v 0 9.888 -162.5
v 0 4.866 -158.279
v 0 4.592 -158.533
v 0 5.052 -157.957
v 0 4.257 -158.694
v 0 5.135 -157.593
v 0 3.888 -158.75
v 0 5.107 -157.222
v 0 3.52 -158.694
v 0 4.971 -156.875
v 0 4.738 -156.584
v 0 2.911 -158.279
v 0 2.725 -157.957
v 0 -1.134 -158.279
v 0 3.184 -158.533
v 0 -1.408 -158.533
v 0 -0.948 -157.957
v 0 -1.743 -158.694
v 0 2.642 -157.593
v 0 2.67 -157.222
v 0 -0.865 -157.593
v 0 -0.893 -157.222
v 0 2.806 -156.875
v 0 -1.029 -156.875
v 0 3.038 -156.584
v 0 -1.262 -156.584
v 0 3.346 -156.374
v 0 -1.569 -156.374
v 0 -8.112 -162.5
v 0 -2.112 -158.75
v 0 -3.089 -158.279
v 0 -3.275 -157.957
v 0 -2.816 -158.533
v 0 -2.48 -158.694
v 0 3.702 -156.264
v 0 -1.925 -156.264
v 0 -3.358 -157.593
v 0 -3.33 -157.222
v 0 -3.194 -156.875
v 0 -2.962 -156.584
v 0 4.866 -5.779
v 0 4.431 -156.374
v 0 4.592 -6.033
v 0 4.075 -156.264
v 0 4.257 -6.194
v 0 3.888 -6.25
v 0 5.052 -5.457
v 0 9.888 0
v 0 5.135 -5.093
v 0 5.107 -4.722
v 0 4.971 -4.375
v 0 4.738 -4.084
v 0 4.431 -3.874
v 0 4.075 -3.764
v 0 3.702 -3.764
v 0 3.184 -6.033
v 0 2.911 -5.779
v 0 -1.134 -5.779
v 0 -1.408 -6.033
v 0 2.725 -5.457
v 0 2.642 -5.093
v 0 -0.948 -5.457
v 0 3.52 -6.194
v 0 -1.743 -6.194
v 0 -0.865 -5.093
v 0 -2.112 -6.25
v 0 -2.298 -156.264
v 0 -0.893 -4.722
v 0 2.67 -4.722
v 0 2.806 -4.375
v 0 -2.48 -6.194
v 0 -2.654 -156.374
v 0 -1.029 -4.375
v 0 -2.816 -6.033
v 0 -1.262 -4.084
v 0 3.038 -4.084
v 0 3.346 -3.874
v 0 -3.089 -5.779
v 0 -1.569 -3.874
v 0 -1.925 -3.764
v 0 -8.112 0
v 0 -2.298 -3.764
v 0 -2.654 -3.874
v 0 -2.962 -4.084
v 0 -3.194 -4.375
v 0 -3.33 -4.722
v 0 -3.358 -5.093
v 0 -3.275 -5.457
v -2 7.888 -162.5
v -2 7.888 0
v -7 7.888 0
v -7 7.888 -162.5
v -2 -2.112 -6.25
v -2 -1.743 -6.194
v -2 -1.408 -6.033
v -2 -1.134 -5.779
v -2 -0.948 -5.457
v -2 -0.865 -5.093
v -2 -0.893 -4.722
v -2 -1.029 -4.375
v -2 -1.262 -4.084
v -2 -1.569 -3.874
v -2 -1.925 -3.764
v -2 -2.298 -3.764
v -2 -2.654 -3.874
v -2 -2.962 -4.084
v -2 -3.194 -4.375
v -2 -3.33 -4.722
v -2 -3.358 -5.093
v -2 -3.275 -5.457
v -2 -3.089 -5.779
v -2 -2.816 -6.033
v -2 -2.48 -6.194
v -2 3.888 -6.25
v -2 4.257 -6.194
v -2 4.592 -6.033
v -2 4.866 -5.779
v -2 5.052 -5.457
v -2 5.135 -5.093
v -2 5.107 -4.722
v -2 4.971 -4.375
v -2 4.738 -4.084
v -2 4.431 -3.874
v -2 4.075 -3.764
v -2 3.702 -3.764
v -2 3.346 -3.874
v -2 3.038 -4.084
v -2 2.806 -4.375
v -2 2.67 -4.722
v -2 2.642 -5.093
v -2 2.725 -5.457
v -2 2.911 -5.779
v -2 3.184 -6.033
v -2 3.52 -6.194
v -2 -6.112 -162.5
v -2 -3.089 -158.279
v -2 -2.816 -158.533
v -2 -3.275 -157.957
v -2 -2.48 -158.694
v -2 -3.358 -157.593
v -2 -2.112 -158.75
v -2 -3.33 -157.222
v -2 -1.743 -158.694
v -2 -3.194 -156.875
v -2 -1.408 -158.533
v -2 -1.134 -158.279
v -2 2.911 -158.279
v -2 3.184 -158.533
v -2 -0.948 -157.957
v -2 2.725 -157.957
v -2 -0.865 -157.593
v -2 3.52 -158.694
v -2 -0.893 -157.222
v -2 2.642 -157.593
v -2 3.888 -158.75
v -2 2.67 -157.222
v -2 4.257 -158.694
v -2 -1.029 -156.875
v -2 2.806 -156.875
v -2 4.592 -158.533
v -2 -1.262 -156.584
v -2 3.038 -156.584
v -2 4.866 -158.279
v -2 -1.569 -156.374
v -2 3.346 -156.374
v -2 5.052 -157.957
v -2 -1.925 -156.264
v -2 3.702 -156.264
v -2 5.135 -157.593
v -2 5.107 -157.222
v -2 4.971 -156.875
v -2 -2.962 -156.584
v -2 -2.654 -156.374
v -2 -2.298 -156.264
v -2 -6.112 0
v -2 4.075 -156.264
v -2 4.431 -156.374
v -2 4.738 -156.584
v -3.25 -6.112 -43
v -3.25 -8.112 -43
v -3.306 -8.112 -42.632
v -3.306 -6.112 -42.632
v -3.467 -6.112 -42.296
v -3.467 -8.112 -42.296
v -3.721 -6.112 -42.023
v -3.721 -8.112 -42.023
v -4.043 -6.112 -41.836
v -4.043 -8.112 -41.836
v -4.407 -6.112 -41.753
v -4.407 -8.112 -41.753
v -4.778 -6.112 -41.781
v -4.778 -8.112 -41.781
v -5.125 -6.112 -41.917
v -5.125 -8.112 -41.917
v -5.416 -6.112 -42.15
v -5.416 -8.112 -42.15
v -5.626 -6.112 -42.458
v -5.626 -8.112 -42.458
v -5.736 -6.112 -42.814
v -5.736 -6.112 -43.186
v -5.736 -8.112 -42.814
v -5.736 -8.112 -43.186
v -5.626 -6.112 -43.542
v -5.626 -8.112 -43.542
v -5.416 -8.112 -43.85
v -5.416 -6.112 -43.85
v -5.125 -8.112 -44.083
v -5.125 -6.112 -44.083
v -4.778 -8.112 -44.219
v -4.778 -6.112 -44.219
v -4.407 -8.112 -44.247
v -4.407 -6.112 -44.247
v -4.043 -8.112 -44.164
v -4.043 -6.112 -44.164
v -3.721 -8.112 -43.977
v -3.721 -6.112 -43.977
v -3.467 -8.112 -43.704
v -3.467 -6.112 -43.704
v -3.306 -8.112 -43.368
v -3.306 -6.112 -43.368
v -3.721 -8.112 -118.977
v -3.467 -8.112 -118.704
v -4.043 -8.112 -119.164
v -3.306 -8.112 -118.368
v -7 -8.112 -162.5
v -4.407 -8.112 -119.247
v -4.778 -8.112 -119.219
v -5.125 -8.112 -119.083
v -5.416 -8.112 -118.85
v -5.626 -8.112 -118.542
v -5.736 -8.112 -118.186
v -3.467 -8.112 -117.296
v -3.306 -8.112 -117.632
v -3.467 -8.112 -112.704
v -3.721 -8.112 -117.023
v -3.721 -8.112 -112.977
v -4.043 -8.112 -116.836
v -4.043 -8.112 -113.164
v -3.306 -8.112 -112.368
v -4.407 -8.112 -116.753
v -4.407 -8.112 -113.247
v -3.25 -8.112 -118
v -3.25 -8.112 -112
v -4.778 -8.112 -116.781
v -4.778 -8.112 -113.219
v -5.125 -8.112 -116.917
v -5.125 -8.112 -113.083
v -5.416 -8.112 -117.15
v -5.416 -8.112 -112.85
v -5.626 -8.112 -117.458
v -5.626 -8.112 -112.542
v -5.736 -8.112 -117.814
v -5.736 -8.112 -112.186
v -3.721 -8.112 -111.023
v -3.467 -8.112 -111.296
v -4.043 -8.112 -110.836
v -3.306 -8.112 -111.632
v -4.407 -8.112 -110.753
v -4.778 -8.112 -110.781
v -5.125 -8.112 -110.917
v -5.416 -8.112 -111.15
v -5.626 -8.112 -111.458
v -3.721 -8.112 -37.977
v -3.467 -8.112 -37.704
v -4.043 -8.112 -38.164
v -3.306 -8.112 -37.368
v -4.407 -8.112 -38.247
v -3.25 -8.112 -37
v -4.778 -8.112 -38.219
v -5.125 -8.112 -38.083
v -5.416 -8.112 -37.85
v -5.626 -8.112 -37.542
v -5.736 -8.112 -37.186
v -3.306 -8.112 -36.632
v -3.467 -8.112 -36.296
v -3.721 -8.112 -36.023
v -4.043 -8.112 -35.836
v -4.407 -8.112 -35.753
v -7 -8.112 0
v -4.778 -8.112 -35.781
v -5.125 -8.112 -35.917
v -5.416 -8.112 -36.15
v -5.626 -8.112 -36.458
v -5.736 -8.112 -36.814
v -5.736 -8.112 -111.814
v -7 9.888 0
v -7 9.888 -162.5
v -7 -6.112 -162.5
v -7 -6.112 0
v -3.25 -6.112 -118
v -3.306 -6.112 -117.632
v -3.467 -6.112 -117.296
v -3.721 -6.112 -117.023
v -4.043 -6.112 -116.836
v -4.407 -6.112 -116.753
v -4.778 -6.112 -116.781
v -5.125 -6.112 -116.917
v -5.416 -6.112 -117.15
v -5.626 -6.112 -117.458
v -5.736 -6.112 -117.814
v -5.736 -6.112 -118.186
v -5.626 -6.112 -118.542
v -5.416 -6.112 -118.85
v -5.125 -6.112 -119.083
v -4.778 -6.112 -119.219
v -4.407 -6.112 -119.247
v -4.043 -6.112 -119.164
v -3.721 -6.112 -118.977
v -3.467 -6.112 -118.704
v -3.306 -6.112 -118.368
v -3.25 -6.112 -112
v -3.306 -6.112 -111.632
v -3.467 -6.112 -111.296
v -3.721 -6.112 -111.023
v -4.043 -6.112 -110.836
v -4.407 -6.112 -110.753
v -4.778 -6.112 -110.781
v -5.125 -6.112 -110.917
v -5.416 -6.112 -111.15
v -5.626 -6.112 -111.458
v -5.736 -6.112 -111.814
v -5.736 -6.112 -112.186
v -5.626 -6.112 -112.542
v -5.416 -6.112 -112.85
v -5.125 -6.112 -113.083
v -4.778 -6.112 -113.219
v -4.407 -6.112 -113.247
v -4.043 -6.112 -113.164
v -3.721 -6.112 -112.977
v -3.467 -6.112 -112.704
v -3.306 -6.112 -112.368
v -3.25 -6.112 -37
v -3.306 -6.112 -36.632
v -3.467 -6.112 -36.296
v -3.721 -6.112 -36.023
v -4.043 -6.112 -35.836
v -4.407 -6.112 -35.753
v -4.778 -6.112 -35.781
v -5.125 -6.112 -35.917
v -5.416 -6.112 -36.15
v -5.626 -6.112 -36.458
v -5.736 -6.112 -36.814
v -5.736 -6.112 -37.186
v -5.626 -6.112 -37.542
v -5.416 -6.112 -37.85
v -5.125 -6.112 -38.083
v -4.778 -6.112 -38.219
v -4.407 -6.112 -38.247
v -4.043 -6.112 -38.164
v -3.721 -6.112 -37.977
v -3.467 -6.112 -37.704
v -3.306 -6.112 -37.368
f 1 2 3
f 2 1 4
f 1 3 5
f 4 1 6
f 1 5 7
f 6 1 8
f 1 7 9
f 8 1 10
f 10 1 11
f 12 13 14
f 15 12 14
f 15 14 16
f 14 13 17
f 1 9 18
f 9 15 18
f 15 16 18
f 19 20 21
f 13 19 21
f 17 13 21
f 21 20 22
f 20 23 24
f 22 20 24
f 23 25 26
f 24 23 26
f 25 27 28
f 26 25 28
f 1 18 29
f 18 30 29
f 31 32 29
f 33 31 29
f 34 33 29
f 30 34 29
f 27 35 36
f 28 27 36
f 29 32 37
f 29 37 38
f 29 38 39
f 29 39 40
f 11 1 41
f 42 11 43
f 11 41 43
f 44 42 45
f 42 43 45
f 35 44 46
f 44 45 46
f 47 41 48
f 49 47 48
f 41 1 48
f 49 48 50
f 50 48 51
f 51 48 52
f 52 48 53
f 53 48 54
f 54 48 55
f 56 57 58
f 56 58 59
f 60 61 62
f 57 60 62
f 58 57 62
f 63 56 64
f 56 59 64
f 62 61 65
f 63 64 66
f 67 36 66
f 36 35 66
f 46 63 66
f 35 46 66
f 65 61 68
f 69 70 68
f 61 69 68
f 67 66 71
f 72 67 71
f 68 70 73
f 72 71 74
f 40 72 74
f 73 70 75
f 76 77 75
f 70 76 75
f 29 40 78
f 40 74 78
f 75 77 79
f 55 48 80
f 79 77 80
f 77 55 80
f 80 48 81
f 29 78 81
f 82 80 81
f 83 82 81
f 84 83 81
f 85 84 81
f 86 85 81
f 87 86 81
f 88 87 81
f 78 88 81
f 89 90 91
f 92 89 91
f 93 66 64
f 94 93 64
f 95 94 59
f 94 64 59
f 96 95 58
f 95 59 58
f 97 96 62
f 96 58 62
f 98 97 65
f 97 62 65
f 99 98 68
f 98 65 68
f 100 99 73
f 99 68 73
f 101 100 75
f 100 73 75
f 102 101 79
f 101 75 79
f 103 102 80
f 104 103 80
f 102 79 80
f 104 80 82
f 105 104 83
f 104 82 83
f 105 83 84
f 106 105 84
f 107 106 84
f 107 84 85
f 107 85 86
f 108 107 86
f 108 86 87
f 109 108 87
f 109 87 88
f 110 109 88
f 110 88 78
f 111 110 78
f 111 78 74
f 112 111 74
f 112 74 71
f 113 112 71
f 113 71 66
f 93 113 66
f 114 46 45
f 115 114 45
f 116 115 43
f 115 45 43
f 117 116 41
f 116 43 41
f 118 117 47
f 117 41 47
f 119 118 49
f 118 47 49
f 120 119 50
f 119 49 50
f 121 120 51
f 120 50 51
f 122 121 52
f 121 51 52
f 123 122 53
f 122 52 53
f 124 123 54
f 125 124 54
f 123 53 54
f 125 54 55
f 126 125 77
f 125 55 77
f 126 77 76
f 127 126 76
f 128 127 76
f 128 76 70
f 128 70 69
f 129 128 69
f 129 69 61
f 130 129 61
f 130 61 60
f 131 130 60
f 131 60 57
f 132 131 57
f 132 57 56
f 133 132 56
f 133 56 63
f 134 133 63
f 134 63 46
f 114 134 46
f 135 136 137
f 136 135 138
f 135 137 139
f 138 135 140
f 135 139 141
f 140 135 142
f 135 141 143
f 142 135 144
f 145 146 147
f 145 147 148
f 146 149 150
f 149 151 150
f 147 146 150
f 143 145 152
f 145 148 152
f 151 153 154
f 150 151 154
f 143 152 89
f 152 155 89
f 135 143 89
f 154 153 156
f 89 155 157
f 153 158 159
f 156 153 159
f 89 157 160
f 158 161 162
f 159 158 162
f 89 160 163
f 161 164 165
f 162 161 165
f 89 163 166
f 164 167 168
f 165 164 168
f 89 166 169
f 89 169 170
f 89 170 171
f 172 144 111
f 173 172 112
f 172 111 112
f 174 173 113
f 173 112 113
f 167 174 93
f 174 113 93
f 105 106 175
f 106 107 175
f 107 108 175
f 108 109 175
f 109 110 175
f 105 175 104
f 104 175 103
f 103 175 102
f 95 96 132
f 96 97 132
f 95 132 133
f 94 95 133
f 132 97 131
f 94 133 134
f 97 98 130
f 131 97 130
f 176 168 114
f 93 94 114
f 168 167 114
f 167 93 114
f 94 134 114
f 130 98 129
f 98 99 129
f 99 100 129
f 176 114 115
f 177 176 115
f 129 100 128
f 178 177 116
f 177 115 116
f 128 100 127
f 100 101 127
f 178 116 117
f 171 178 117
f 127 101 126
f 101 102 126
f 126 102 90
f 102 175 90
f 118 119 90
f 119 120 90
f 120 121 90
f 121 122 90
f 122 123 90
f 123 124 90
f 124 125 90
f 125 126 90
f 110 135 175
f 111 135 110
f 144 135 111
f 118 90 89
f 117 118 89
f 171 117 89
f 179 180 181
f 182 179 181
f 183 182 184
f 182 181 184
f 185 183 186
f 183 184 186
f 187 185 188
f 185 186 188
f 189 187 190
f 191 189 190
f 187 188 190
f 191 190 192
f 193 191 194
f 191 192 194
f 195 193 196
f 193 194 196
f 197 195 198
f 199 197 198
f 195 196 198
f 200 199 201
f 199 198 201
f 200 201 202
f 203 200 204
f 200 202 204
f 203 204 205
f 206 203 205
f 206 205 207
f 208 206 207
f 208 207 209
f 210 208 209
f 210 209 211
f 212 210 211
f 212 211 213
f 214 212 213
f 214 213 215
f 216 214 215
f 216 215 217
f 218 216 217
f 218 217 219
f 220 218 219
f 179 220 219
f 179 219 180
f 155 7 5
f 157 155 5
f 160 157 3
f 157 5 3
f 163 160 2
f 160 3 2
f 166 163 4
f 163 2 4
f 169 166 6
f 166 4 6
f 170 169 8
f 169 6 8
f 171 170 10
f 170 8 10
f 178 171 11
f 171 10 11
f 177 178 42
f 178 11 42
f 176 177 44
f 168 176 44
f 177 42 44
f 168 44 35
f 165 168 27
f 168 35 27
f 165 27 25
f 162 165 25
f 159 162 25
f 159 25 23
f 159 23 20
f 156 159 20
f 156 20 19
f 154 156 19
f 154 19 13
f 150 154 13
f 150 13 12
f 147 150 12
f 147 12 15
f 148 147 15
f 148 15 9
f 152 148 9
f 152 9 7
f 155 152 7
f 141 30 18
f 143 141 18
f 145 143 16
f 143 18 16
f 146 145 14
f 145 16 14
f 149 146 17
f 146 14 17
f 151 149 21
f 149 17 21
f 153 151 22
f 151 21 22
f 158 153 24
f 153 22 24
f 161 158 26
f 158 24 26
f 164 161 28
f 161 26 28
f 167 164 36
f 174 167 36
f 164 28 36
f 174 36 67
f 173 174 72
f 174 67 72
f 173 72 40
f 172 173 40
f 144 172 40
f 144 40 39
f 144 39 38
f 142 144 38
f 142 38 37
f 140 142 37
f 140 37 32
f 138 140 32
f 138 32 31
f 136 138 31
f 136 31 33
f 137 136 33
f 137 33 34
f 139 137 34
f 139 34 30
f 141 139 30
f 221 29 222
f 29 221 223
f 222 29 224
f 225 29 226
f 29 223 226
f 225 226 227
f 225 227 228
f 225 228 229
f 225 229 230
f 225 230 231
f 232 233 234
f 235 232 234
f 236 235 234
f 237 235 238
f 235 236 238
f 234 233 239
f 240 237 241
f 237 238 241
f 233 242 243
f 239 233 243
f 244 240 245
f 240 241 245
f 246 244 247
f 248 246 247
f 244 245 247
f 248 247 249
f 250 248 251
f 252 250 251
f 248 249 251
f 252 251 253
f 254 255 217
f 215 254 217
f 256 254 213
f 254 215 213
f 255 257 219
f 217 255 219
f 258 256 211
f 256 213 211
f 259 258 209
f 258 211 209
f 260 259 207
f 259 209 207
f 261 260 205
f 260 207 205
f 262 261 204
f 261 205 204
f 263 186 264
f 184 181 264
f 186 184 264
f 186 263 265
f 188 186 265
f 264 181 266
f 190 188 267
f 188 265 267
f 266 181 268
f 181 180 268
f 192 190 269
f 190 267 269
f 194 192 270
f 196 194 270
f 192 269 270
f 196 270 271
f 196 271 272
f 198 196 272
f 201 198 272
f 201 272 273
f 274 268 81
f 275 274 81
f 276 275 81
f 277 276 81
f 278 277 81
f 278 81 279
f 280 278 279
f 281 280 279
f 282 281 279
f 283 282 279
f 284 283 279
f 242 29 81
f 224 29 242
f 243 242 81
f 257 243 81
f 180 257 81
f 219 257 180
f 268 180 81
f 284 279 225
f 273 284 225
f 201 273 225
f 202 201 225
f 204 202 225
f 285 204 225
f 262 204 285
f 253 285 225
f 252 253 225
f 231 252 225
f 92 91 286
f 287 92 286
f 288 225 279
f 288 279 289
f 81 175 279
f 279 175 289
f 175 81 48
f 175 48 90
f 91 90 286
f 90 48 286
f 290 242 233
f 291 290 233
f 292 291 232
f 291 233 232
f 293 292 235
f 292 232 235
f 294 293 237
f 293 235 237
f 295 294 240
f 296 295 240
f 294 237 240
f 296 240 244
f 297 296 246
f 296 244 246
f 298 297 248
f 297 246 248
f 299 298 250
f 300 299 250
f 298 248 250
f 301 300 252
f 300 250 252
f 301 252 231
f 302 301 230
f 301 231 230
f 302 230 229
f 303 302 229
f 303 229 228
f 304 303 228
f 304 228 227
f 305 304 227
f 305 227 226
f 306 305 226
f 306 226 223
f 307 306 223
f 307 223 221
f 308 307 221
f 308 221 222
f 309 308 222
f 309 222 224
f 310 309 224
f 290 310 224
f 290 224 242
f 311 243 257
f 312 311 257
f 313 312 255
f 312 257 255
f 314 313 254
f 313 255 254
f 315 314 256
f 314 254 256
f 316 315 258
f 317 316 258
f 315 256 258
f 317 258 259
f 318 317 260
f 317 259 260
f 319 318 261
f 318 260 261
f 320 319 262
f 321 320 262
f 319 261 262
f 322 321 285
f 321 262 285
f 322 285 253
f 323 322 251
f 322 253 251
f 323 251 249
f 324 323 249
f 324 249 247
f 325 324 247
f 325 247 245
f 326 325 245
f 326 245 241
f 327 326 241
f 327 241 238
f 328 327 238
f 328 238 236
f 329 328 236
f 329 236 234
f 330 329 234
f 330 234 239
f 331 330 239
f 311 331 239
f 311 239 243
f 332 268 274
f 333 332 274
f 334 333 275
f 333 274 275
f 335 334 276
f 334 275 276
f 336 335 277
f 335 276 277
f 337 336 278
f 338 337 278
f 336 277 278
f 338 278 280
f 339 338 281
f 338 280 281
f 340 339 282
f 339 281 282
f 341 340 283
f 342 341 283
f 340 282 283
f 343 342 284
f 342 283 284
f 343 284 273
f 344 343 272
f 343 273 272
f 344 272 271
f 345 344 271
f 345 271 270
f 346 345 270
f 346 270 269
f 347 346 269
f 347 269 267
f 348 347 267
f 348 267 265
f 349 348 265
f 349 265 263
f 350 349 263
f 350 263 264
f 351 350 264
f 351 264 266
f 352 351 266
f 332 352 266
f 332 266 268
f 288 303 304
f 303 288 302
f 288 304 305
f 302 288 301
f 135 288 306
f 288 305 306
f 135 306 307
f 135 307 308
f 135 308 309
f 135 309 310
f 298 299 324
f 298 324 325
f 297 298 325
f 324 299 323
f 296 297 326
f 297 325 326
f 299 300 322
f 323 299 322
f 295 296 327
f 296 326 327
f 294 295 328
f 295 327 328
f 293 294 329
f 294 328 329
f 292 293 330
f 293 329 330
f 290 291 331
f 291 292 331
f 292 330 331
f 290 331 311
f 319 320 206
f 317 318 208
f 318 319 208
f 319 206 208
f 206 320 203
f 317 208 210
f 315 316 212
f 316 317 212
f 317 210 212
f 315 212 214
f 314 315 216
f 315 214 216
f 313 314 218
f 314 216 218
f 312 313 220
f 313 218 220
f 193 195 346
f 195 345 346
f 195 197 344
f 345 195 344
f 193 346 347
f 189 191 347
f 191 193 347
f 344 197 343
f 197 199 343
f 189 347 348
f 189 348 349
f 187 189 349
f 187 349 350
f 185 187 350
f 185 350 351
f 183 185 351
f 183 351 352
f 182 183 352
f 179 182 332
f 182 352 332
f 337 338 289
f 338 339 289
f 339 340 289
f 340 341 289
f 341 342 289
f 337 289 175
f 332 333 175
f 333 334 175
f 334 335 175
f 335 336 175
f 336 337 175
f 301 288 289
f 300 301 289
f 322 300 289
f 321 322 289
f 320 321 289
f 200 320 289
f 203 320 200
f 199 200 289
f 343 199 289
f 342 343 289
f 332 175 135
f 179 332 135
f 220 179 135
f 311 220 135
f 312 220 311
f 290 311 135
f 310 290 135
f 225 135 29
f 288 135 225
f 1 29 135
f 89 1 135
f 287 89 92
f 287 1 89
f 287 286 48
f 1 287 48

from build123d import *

# Parameters (mm, degrees)
BOSS_EXTRUDE1_DEPTH = 162.5
SKETCH2_R           = 1.25
CUT_EXTRUDE1_DEPTH  = 8
SKETCH3_R           = 1.25
CUT_EXTRUDE2_DEPTH  = 10


with BuildPart() as part:
    # Sketch1 → Boss-Extrude1 (new body)
    with BuildSketch(Plane.XY):
        Polygon((-7, 9.888282785), (0, 9.888282785), (0, -8.111717215), (-7, -8.111717215), (-7, -6.111717215), (-2, -6.111717215), (-2, 7.888282785), (-7, 7.888282785), align=None)
    extrude(amount=-BOSS_EXTRUDE1_DEPTH)

    # Sketch2 → Cut-Extrude1 (cut, through all)
    with BuildSketch(Plane(origin=(0, 0, 0), x_dir=(0, 0, -1), z_dir=(1, 0, 0))):
        with Locations((5, 3.888282785)):
            Circle(SKETCH2_R)
        with Locations((5, -2.111717215)):
            Circle(SKETCH2_R)
        with Locations((157.5, -2.111717215)):
            Circle(SKETCH2_R)
        with Locations((157.5, 3.888282785)):
            Circle(SKETCH2_R)
    extrude(amount=-CUT_EXTRUDE1_DEPTH, mode=Mode.SUBTRACT)

    # Sketch3 → Cut-Extrude2 (cut)
    with BuildSketch(Plane.XZ.offset(8.111717215)):
        with Locations((-4.5, -37)):
            Circle(SKETCH3_R)
        with Locations((-4.5, -43)):
            Circle(SKETCH3_R)
        with Locations((-4.5, -112)):
            Circle(SKETCH3_R)
        with Locations((-4.5, -118)):
            Circle(SKETCH3_R)
    extrude(amount=-CUT_EXTRUDE2_DEPTH, mode=Mode.SUBTRACT)


solid = part.part
